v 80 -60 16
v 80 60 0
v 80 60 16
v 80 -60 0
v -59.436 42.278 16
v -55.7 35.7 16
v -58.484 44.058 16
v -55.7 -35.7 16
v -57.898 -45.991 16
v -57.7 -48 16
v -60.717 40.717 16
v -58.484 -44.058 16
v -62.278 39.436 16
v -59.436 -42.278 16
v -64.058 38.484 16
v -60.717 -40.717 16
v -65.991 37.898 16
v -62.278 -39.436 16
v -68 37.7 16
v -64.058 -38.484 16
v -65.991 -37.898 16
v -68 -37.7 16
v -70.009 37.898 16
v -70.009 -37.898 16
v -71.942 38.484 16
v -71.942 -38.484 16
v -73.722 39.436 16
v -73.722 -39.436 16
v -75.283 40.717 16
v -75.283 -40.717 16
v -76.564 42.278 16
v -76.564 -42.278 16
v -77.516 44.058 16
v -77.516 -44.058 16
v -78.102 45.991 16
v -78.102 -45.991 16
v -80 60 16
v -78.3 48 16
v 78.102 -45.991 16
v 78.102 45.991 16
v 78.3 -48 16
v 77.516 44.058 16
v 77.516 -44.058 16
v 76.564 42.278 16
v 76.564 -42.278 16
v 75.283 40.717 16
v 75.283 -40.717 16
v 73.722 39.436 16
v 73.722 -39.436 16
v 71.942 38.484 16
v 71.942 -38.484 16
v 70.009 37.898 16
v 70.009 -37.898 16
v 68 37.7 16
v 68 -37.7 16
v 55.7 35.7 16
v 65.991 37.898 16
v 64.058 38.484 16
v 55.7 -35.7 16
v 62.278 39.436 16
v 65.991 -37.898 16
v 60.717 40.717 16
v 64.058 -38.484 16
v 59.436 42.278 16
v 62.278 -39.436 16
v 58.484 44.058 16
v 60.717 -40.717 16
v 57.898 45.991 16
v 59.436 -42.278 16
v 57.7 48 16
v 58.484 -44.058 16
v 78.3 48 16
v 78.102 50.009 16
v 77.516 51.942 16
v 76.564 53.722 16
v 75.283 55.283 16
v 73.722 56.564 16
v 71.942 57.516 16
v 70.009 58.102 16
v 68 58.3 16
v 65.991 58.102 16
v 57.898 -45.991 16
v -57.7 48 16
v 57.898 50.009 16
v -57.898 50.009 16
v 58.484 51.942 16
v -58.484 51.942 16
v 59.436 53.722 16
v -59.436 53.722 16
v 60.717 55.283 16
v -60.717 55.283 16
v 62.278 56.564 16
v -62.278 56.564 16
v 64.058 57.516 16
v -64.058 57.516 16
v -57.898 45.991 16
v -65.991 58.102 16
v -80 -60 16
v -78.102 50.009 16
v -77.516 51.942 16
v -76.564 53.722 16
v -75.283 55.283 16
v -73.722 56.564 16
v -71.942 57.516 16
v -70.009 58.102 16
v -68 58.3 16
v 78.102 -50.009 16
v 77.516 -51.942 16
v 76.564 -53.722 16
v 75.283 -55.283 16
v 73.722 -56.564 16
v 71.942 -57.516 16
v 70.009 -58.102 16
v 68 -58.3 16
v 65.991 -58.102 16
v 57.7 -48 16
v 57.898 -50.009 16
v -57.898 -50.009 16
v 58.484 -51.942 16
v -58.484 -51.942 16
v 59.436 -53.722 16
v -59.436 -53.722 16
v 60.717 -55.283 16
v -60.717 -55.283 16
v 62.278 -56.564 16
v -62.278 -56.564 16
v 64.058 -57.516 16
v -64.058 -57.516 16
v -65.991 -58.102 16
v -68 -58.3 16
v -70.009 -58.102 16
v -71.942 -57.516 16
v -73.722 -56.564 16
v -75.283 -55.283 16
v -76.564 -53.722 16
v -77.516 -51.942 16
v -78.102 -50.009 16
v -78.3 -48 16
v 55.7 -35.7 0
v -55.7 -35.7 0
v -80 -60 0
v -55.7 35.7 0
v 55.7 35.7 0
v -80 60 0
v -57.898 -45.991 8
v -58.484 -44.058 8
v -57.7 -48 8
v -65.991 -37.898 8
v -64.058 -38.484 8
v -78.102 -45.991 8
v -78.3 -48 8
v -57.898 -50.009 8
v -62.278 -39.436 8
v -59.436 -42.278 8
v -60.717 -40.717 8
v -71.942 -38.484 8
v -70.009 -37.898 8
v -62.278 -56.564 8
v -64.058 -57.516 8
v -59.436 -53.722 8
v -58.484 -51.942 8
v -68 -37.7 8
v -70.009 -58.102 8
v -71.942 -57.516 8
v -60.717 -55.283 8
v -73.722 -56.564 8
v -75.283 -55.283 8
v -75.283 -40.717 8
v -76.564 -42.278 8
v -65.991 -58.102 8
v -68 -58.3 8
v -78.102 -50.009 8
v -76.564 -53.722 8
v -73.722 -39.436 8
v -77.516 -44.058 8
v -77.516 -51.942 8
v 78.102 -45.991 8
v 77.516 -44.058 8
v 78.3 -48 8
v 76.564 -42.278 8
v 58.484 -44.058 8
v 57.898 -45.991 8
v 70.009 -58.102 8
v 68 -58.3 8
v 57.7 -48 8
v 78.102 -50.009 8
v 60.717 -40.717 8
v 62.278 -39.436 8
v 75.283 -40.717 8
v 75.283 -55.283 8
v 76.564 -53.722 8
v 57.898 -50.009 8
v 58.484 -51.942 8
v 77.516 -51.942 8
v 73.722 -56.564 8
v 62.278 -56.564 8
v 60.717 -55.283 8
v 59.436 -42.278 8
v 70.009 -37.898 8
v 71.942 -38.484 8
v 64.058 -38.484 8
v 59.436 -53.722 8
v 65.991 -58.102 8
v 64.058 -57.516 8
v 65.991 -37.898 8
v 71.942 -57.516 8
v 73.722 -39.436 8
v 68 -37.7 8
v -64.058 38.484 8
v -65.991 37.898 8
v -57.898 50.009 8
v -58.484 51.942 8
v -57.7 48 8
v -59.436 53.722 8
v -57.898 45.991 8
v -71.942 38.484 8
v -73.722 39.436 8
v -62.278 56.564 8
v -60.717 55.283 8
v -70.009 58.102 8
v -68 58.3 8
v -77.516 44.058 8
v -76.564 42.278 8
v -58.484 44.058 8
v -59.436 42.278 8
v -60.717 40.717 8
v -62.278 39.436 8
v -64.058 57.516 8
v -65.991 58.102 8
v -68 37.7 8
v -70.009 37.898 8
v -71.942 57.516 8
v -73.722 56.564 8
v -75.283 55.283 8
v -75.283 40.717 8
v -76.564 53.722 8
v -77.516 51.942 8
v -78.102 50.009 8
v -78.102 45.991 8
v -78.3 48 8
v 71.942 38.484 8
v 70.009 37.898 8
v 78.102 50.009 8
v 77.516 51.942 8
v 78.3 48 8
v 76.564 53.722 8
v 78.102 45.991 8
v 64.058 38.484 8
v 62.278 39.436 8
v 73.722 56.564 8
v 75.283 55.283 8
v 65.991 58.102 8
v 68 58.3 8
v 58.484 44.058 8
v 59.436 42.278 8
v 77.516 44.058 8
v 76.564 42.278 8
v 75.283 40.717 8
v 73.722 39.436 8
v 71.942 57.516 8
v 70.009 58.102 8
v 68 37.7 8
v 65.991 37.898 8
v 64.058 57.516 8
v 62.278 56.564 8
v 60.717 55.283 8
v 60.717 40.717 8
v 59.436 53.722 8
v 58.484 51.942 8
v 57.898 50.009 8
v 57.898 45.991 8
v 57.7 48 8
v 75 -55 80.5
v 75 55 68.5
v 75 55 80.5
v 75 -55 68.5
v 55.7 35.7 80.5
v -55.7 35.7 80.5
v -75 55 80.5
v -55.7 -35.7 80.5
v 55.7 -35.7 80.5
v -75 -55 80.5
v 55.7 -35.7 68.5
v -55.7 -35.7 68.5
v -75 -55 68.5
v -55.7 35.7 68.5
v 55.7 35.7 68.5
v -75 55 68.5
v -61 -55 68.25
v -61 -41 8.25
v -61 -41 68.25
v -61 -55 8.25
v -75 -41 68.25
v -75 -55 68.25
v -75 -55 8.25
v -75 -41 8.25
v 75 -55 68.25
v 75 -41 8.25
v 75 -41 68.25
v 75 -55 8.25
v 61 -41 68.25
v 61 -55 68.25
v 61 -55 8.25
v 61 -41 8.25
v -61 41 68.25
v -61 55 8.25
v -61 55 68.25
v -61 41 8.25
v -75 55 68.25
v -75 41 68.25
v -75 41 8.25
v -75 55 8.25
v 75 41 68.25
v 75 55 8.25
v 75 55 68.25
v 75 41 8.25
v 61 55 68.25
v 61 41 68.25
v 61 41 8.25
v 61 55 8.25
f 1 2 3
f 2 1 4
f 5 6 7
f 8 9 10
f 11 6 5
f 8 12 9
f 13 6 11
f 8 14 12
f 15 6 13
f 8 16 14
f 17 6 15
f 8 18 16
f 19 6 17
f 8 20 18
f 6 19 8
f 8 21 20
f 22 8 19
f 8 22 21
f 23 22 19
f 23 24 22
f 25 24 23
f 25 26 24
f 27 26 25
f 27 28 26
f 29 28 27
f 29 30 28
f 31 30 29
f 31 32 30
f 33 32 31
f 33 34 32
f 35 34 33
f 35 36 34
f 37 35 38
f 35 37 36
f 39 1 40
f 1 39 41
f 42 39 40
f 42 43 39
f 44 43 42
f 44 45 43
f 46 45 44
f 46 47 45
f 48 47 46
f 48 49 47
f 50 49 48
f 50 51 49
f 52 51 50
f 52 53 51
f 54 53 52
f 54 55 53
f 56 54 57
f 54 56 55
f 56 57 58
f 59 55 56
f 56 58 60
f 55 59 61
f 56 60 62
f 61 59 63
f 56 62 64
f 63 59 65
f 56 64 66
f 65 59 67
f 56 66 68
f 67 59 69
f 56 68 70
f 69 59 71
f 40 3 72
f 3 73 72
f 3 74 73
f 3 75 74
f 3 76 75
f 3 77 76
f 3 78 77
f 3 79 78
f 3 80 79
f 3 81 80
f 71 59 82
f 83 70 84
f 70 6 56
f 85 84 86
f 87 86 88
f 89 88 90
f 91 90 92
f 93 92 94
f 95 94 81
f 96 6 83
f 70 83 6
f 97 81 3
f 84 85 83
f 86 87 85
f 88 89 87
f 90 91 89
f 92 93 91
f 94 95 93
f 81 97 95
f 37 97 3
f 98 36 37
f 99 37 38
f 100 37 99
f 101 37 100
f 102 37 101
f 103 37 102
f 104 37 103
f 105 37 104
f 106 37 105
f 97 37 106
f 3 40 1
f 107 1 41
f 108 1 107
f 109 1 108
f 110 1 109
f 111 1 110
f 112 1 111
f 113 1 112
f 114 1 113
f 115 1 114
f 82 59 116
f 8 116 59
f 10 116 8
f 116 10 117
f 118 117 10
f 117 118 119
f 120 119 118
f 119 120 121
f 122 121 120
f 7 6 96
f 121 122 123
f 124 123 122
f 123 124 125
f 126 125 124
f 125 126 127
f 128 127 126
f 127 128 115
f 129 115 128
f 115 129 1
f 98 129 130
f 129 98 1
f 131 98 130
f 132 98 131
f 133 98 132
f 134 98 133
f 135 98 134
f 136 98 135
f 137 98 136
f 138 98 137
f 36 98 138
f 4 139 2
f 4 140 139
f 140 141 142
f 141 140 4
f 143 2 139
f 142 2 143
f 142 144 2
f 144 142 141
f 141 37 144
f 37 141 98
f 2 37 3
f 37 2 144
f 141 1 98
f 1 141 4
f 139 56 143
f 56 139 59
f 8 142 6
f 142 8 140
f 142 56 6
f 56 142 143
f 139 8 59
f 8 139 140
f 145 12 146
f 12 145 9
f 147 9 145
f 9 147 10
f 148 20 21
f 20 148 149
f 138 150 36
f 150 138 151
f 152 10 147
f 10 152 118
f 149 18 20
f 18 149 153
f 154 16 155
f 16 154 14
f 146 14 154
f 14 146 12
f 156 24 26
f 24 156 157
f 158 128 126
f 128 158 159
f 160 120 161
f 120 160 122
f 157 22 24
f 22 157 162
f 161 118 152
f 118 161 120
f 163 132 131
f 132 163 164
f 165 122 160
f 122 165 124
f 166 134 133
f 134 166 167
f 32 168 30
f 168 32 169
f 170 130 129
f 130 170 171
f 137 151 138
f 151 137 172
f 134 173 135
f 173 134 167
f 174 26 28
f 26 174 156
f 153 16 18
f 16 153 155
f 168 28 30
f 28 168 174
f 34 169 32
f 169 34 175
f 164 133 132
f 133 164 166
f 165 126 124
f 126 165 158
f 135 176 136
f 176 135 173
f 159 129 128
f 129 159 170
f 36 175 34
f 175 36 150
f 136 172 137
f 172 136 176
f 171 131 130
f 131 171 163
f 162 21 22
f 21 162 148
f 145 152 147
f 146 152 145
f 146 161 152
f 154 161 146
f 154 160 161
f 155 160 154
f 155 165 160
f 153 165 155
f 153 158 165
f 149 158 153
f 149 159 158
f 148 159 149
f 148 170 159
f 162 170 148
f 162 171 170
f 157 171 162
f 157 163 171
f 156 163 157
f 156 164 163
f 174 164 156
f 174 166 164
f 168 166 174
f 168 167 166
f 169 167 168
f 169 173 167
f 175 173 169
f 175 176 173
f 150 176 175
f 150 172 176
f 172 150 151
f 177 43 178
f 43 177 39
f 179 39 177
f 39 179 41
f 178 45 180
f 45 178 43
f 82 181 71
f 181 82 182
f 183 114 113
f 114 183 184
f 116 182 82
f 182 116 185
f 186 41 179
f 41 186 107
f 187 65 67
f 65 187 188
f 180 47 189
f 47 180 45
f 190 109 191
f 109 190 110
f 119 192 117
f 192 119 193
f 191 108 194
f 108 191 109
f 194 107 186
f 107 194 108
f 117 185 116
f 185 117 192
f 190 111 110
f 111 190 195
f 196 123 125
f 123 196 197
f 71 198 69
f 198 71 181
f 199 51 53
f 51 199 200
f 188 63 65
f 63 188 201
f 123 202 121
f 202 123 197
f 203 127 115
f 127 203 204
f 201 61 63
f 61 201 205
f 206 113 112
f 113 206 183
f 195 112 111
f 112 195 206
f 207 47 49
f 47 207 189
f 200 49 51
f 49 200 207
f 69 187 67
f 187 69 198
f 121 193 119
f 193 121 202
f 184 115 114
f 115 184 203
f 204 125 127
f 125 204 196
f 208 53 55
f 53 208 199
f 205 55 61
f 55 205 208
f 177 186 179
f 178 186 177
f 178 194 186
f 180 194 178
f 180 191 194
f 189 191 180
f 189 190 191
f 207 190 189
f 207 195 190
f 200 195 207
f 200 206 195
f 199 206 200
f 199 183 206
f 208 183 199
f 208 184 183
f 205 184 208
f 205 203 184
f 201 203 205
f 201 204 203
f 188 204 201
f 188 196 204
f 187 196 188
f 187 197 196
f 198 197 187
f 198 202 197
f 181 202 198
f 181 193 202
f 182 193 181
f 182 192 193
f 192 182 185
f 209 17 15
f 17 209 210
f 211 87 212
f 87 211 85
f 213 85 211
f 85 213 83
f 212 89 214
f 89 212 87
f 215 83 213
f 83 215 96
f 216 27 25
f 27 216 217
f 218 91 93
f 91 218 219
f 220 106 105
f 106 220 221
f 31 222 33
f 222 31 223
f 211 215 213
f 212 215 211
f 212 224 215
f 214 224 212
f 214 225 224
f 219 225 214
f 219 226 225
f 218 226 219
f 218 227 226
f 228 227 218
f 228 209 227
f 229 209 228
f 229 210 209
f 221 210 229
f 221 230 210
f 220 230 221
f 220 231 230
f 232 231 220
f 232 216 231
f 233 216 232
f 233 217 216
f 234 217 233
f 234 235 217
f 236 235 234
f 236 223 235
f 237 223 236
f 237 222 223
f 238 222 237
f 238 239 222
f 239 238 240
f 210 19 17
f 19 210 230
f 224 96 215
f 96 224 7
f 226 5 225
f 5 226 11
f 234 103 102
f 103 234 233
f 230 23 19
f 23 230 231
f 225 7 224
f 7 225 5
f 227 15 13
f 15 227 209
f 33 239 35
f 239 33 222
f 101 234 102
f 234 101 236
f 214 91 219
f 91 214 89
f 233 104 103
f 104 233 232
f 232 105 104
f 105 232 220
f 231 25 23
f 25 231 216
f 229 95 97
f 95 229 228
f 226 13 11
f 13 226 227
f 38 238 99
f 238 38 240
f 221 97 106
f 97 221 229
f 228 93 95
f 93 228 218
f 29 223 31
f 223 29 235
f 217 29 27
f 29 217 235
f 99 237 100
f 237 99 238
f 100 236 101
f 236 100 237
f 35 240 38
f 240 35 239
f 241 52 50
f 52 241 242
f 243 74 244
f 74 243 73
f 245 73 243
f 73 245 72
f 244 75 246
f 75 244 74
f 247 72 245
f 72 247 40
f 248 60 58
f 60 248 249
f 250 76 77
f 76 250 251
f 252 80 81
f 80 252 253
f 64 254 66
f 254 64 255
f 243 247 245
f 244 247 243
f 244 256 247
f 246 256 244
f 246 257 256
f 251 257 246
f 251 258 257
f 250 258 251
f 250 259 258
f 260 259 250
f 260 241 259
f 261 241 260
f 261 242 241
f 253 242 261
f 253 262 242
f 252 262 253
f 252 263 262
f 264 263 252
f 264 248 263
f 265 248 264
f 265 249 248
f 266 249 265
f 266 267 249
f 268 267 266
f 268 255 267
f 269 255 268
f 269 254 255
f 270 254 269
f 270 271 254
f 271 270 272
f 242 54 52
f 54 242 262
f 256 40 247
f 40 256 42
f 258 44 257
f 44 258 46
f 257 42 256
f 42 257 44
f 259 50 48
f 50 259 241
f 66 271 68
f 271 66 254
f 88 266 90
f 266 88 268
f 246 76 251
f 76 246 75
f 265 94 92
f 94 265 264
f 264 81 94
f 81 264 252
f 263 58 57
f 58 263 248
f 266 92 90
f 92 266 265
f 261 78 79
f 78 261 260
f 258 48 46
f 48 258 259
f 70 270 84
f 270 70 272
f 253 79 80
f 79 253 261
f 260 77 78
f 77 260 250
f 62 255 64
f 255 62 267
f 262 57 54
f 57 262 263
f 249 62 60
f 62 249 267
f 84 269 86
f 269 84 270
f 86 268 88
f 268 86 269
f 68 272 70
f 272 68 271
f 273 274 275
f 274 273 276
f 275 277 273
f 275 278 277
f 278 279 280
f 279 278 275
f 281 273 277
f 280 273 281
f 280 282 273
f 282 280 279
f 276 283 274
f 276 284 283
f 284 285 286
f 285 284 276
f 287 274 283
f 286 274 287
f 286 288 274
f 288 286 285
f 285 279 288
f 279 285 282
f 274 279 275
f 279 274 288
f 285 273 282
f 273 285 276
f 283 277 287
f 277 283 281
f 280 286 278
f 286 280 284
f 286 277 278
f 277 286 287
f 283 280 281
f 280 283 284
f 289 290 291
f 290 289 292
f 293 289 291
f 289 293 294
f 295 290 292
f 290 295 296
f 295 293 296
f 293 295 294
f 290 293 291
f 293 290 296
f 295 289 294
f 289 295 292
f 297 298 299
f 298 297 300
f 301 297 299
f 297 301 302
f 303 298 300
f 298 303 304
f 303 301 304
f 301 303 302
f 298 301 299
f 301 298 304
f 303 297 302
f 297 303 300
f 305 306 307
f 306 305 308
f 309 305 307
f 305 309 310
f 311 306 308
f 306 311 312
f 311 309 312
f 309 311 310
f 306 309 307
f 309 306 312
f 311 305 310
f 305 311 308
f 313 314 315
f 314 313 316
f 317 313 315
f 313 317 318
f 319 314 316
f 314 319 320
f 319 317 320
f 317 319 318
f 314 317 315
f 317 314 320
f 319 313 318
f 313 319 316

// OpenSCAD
$fn = 32;

// ------------------------------------------------------------------------
// Frame cube: base 160 x 120 mm, posts 60 mm tall
// Every part is its own module, assembly() places every instance.
// ------------------------------------------------------------------------

// --- part 1 ---
module base_frame() {
  difference() {
    translate([-80, -60, 0]) cube([160, 120, 16]);
    translate([-55.7, -35.7, -1]) cube([111.4, 71.4, 18]);
    translate([-68, -48, 8]) cylinder(h = 9, d = 20.6);
    translate([68, -48, 8]) cylinder(h = 9, d = 20.6);
    translate([-68, 48, 8]) cylinder(h = 9, d = 20.6);
    translate([68, 48, 8]) cylinder(h = 9, d = 20.6);
  }
}

// --- part 2 ---
module corner_post() {
  translate([-7, -7, 0]) cube([14, 14, 60]);
}

// --- part 3 ---
module top_frame() {
  difference() {
    translate([-75, -55, 0]) cube([150, 110, 12]);
    translate([-55.7, -35.7, -1]) cube([111.4, 71.4, 14]);
  }
}

// --- assembly ---
module assembly() {
  color([0.80, 0.24, 0.20]) translate([0, 0, 0]) rotate([0, 0, 0]) base_frame();
  color([0.20, 0.45, 0.75]) translate([-68, -48, 8.25]) rotate([0, 0, 0]) corner_post();
  color([0.25, 0.62, 0.32]) translate([68, -48, 8.25]) rotate([0, 0, 0]) corner_post();
  color([0.92, 0.70, 0.18]) translate([-68, 48, 8.25]) rotate([0, 0, 0]) corner_post();
  color([0.58, 0.35, 0.70]) translate([68, 48, 8.25]) rotate([0, 0, 0]) corner_post();
  color([0.16, 0.66, 0.66]) translate([0, 0, 68.5]) rotate([0, 0, 0]) top_frame();
}

assembly();
